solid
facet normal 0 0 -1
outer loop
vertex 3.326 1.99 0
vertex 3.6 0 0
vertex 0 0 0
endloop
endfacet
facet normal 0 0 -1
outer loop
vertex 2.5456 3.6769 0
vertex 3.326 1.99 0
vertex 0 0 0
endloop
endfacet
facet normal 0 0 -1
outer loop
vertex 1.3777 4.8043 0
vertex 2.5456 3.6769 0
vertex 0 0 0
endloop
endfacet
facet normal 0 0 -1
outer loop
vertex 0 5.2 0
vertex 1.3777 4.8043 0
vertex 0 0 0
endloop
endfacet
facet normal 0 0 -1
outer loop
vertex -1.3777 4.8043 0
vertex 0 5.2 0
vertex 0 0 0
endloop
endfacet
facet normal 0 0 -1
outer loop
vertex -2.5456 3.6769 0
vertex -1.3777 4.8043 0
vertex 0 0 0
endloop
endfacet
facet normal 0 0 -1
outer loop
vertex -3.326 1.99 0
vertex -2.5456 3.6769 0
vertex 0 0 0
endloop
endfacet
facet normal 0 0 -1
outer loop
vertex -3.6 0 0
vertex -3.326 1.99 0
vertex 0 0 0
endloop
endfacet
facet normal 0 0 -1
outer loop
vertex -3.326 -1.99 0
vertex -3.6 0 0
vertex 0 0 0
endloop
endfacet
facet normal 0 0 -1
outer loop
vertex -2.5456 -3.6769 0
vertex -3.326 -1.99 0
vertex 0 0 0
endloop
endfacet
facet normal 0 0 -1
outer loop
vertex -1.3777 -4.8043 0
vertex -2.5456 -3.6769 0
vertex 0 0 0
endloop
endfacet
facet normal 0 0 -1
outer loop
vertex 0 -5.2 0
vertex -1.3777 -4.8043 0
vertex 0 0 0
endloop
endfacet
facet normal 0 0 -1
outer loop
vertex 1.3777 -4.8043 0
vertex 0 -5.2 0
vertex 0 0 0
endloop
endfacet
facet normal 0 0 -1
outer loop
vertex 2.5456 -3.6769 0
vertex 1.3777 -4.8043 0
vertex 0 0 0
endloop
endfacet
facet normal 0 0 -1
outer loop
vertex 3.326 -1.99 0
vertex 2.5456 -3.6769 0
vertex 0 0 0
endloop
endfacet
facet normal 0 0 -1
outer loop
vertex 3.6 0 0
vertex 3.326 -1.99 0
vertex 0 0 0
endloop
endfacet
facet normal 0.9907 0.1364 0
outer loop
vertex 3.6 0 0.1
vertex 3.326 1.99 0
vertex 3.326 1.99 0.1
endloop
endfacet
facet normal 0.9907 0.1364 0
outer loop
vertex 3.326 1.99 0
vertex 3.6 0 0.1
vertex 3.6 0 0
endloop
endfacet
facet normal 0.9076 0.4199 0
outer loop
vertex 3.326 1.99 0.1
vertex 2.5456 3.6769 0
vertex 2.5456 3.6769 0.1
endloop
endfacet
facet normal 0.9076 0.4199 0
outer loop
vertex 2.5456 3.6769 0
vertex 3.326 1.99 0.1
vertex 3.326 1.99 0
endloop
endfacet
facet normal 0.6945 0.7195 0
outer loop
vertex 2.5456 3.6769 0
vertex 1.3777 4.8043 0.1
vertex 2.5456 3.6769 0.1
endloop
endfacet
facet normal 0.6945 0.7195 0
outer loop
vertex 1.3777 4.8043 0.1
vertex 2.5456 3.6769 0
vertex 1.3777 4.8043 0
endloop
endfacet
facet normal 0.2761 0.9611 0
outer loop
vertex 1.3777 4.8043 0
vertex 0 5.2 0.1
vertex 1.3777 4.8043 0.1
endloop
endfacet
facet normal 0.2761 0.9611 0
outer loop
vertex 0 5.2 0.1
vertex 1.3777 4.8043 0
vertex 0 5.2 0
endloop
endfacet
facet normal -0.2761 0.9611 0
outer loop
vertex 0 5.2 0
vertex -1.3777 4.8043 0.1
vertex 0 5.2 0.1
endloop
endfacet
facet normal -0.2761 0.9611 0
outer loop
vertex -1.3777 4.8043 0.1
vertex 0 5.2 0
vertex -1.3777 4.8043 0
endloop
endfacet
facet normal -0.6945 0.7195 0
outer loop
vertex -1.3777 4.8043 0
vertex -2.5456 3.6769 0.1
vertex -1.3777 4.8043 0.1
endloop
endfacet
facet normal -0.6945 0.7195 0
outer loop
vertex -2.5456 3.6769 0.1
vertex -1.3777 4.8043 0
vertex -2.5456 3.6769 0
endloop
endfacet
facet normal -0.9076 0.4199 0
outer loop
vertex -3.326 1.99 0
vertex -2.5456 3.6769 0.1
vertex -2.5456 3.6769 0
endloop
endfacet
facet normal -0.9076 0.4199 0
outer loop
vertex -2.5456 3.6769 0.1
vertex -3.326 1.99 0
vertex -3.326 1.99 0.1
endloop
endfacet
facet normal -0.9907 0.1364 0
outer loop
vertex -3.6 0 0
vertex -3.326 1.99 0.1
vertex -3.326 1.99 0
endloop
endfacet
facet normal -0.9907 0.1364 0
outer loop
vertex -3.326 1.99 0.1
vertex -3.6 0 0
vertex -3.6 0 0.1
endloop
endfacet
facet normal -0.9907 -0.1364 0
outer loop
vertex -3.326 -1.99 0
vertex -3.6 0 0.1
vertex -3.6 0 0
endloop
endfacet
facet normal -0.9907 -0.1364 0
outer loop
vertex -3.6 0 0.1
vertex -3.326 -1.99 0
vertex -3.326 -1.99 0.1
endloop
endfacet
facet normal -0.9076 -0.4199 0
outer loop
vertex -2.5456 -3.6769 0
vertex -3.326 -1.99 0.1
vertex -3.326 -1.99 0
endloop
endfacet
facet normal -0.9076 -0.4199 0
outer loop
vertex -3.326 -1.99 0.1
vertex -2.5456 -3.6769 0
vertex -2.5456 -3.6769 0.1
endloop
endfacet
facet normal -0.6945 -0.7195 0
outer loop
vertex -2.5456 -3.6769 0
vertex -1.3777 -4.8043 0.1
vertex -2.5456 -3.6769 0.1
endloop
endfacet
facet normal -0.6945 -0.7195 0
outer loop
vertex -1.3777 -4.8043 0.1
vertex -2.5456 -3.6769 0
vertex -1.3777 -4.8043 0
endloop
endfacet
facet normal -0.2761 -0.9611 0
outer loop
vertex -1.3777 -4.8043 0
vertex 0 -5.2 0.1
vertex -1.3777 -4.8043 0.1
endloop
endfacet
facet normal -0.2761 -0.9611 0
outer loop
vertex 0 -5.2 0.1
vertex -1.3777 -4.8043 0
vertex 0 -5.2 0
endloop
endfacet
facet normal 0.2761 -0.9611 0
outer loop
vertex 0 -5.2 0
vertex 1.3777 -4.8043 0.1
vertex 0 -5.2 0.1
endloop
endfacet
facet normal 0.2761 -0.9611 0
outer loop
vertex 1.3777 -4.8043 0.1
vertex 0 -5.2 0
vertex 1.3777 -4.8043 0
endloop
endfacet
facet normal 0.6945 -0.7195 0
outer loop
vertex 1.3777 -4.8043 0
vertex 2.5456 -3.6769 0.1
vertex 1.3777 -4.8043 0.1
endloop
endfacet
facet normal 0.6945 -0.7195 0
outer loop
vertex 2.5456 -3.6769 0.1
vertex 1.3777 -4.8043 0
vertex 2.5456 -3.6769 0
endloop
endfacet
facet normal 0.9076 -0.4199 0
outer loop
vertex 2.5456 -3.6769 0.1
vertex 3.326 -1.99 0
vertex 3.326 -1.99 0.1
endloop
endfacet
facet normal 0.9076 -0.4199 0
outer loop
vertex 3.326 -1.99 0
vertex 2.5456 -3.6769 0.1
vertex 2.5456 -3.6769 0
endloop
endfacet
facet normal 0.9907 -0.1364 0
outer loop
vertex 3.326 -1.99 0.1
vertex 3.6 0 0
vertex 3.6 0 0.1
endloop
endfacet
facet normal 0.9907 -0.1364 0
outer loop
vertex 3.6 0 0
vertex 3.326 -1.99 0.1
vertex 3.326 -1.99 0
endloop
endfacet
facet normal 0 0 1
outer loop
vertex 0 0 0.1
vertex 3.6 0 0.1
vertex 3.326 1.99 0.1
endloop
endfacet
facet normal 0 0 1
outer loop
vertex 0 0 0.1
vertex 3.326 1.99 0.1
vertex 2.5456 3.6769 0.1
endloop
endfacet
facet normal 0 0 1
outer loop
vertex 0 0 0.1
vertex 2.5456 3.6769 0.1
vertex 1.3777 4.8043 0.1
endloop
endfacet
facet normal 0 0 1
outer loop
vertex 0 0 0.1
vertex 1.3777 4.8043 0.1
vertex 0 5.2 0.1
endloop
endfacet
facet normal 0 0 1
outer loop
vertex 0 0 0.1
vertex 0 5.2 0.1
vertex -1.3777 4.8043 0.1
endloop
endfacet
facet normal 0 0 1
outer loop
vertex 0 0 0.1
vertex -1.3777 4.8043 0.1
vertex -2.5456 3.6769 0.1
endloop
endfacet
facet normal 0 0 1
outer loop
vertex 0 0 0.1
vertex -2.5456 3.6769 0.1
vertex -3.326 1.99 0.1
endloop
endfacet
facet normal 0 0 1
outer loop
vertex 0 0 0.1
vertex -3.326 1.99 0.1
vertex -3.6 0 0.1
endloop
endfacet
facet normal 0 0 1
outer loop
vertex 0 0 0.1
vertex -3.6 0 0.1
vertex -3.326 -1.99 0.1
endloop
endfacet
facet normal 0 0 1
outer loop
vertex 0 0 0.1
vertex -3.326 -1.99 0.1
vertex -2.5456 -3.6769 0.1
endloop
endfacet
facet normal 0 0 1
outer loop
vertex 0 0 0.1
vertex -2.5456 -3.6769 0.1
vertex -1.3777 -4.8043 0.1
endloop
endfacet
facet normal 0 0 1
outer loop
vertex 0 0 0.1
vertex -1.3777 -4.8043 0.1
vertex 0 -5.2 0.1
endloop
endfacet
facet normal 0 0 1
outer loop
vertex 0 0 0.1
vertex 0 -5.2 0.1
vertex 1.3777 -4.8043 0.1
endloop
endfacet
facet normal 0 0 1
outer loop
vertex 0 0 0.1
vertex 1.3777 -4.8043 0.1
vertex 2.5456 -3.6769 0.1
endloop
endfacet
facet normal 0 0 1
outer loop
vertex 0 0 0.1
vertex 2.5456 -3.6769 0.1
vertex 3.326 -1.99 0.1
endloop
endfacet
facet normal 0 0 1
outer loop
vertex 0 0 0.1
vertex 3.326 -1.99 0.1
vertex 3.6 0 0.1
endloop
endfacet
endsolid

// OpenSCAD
// file: ../p/4-4cyli.scad
use <../lib.scad>
function ldraw_lib__4_4cyli() = [
// 0 Cylinder 1.0
// 0 Name: 4-4cyli.dat
// 0 Author: James Jessiman
// 0 !LDRAW_ORG Primitive UPDATE 2005-01
// 0 !LICENSE Licensed under CC BY 4.0 : see CAreadme.txt
// 
// 0 BFC CERTIFY CCW
  [0,"BFC","CERTIFY"],
  [0,"BFC","CCW"],
// 
// 0 !HISTORY 1998-12-15 [PTadmin] Official Update 1998-10
// 0 !HISTORY 2002-03-23 [sbliss] Added BFC statement; merged headers from files in distributions LDraw 0.27 and Complete.
// 0 !HISTORY 2002-04-25 [PTadmin] Official Update 2002-02
// 0 !HISTORY 2004-12-14 [guyvivan] BFC CCW
// 0 !HISTORY 2005-12-28 [PTadmin] Official Update 2005-01
// 0 !HISTORY 2007-06-24 [PTadmin] Header formatted for Contributor Agreement
// 0 !HISTORY 2008-07-01 [PTadmin] Official Update 2008-01
// 
// 
// 4 16 1 1 0 0.9239 1 0.3827 0.9239 0 0.3827 1 0 0
  [4,16,1,1,0,0.9239,1,0.3827,0.9239,0,0.3827,1,0,0],
// 5 24 1 0 0 1 1 0 0.9239 0 0.3827 0.9239 0 -0.3827
  [5,24,1,0,0,1,1,0,0.9239,0,0.3827,0.9239,0,-0.3827],
// 4 16 0.9239 1 0.3827 0.7071 1 0.7071 0.7071 0 0.7071 0.9239 0 0.3827
  [4,16,0.9239,1,0.3827,0.7071,1,0.7071,0.7071,0,0.7071,0.9239,0,0.3827],
// 5 24 0.9239 0 0.3827 0.9239 1 0.3827 0.7071 0 0.7071 1 0 0
  [5,24,0.9239,0,0.3827,0.9239,1,0.3827,0.7071,0,0.7071,1,0,0],
// 4 16 0.7071 1 0.7071 0.3827 1 0.9239 0.3827 0 0.9239 0.7071 0 0.7071
  [4,16,0.7071,1,0.7071,0.3827,1,0.9239,0.3827,0,0.9239,0.7071,0,0.7071],
// 5 24 0.7071 0 0.7071 0.7071 1 0.7071 0.3827 0 0.9239 0.9239 0 0.3827
  [5,24,0.7071,0,0.7071,0.7071,1,0.7071,0.3827,0,0.9239,0.9239,0,0.3827],
// 4 16 0.3827 1 0.9239 0 1 1 0 0 1 0.3827 0 0.9239
  [4,16,0.3827,1,0.9239,0,1,1,0,0,1,0.3827,0,0.9239],
// 5 24 0.3827 0 0.9239 0.3827 1 0.9239 0 0 1 0.7071 0 0.7071
  [5,24,0.3827,0,0.9239,0.3827,1,0.9239,0,0,1,0.7071,0,0.7071],
// 4 16 0 1 1 -0.3827 1 0.9239 -0.3827 0 0.9239 0 0 1
  [4,16,0,1,1,-0.3827,1,0.9239,-0.3827,0,0.9239,0,0,1],
// 5 24 0 0 1 0 1 1 -0.3827 0 0.9239 0.3827 0 0.9239
  [5,24,0,0,1,0,1,1,-0.3827,0,0.9239,0.3827,0,0.9239],
// 4 16 -0.3827 1 0.9239 -0.7071 1 0.7071 -0.7071 0 0.7071 -0.3827 0 0.9239
  [4,16,-0.3827,1,0.9239,-0.7071,1,0.7071,-0.7071,0,0.7071,-0.3827,0,0.9239],
// 5 24 -0.3827 0 0.9239 -0.3827 1 0.9239 -0.7071 0 0.7071 0 0 1
  [5,24,-0.3827,0,0.9239,-0.3827,1,0.9239,-0.7071,0,0.7071,0,0,1],
// 4 16 -0.7071 1 0.7071 -0.9239 1 0.3827 -0.9239 0 0.3827 -0.7071 0 0.7071
  [4,16,-0.7071,1,0.7071,-0.9239,1,0.3827,-0.9239,0,0.3827,-0.7071,0,0.7071],
// 5 24 -0.7071 0 0.7071 -0.7071 1 0.7071 -0.9239 0 0.3827 -0.3827 0 0.9239
  [5,24,-0.7071,0,0.7071,-0.7071,1,0.7071,-0.9239,0,0.3827,-0.3827,0,0.9239],
// 4 16 -0.9239 1 0.3827 -1 1 0 -1 0 0 -0.9239 0 0.3827
  [4,16,-0.9239,1,0.3827,-1,1,0,-1,0,0,-0.9239,0,0.3827],
// 5 24 -0.9239 0 0.3827 -0.9239 1 0.3827 -1 0 0 -0.7071 0 0.7071
  [5,24,-0.9239,0,0.3827,-0.9239,1,0.3827,-1,0,0,-0.7071,0,0.7071],
// 4 16 -1 1 0 -0.9239 1 -0.3827 -0.9239 0 -0.3827 -1 0 0
  [4,16,-1,1,0,-0.9239,1,-0.3827,-0.9239,0,-0.3827,-1,0,0],
// 5 24 -1 0 0 -1 1 0 -0.9239 0 -0.3827 -0.9239 0 0.3827
  [5,24,-1,0,0,-1,1,0,-0.9239,0,-0.3827,-0.9239,0,0.3827],
// 4 16 -0.9239 1 -0.3827 -0.7071 1 -0.7071 -0.7071 0 -0.7071 -0.9239 0 -0.3827
  [4,16,-0.9239,1,-0.3827,-0.7071,1,-0.7071,-0.7071,0,-0.7071,-0.9239,0,-0.3827],
// 5 24 -0.9239 0 -0.3827 -0.9239 1 -0.3827 -0.7071 0 -0.7071 -1 0 0
  [5,24,-0.9239,0,-0.3827,-0.9239,1,-0.3827,-0.7071,0,-0.7071,-1,0,0],
// 4 16 -0.7071 1 -0.7071 -0.3827 1 -0.9239 -0.3827 0 -0.9239 -0.7071 0 -0.7071
  [4,16,-0.7071,1,-0.7071,-0.3827,1,-0.9239,-0.3827,0,-0.9239,-0.7071,0,-0.7071],
// 5 24 -0.7071 0 -0.7071 -0.7071 1 -0.7071 -0.3827 0 -0.9239 -0.9239 0 -0.3827
  [5,24,-0.7071,0,-0.7071,-0.7071,1,-0.7071,-0.3827,0,-0.9239,-0.9239,0,-0.3827],
// 4 16 -0.3827 1 -0.9239 0 1 -1 0 0 -1 -0.3827 0 -0.9239
  [4,16,-0.3827,1,-0.9239,0,1,-1,0,0,-1,-0.3827,0,-0.9239],
// 5 24 -0.3827 0 -0.9239 -0.3827 1 -0.9239 0 0 -1 -0.7071 0 -0.7071
  [5,24,-0.3827,0,-0.9239,-0.3827,1,-0.9239,0,0,-1,-0.7071,0,-0.7071],
// 4 16 0 1 -1 0.3827 1 -0.9239 0.3827 0 -0.9239 0 0 -1
  [4,16,0,1,-1,0.3827,1,-0.9239,0.3827,0,-0.9239,0,0,-1],
// 5 24 0 0 -1 0 1 -1 0.3827 0 -0.9239 -0.3827 0 -0.9239
  [5,24,0,0,-1,0,1,-1,0.3827,0,-0.9239,-0.3827,0,-0.9239],
// 4 16 0.3827 1 -0.9239 0.7071 1 -0.7071 0.7071 0 -0.7071 0.3827 0 -0.9239
  [4,16,0.3827,1,-0.9239,0.7071,1,-0.7071,0.7071,0,-0.7071,0.3827,0,-0.9239],
// 5 24 0.3827 0 -0.9239 0.3827 1 -0.9239 0.7071 0 -0.7071 0 0 -1
  [5,24,0.3827,0,-0.9239,0.3827,1,-0.9239,0.7071,0,-0.7071,0,0,-1],
// 4 16 0.7071 1 -0.7071 0.9239 1 -0.3827 0.9239 0 -0.3827 0.7071 0 -0.7071
  [4,16,0.7071,1,-0.7071,0.9239,1,-0.3827,0.9239,0,-0.3827,0.7071,0,-0.7071],
// 5 24 0.7071 0 -0.7071 0.7071 1 -0.7071 0.9239 0 -0.3827 0.3827 0 -0.9239
  [5,24,0.7071,0,-0.7071,0.7071,1,-0.7071,0.9239,0,-0.3827,0.3827,0,-0.9239],
// 4 16 0.9239 1 -0.3827 1 1 0 1 0 0 0.9239 0 -0.3827
  [4,16,0.9239,1,-0.3827,1,1,0,1,0,0,0.9239,0,-0.3827],
// 5 24 0.9239 0 -0.3827 0.9239 1 -0.3827 1 0 0 0.7071 0 -0.7071
  [5,24,0.9239,0,-0.3827,0.9239,1,-0.3827,1,0,0,0.7071,0,-0.7071],
// 0
];
module ldraw_lib__4_4cyli(step=0, col=false, unit=2/5, alt=false, line=0.2, solid=!$preview)
    makepoly(ldraw_lib__4_4cyli(), step=step, col=col, unit=unit, alt=alt, line=line, solid=solid);
ldraw_lib__4_4cyli(line=0.2);
// file: ../p/4-4disc.scad
use <../lib.scad>
function ldraw_lib__4_4disc() = [
// 0 Disc 1.0
// 0 Name: 4-4disc.dat
// 0 Author: James Jessiman
// 0 !LDRAW_ORG Primitive UPDATE 2002-02
// 0 !LICENSE Licensed under CC BY 4.0 : see CAreadme.txt
// 
// 0 BFC CERTIFY CCW
  [0,"BFC","CERTIFY"],
  [0,"BFC","CCW"],
// 
// 0 !HISTORY 1998-12-15 [PTadmin] Official Update 1998-10
// 0 !HISTORY 2002-03-23 [sbliss] Added BFC statement
// 0 !HISTORY 2002-04-25 [PTadmin] Official Update 2002-02
// 0 !HISTORY 2007-06-24 [PTadmin] Header formatted for Contributor Agreement
// 0 !HISTORY 2008-07-01 [PTadmin] Official Update 2008-01
// 
// 
// 3 16 0 0 0 1 0 0 0.9239 0 0.3827
  [3,16,0,0,0,1,0,0,0.9239,0,0.3827],
// 3 16 0 0 0 0.9239 0 0.3827 0.7071 0 0.7071
  [3,16,0,0,0,0.9239,0,0.3827,0.7071,0,0.7071],
// 3 16 0 0 0 0.7071 0 0.7071 0.3827 0 0.9239
  [3,16,0,0,0,0.7071,0,0.7071,0.3827,0,0.9239],
// 3 16 0 0 0 0.3827 0 0.9239 0 0 1
  [3,16,0,0,0,0.3827,0,0.9239,0,0,1],
// 3 16 0 0 0 0 0 1 -0.3827 0 0.9239
  [3,16,0,0,0,0,0,1,-0.3827,0,0.9239],
// 3 16 0 0 0 -0.3827 0 0.9239 -0.7071 0 0.7071
  [3,16,0,0,0,-0.3827,0,0.9239,-0.7071,0,0.7071],
// 3 16 0 0 0 -0.7071 0 0.7071 -0.9239 0 0.3827
  [3,16,0,0,0,-0.7071,0,0.7071,-0.9239,0,0.3827],
// 3 16 0 0 0 -0.9239 0 0.3827 -1 0 -0
  [3,16,0,0,0,-0.9239,0,0.3827,-1,0,-0],
// 3 16 0 0 0 -1 0 -0 -0.9239 0 -0.3827
  [3,16,0,0,0,-1,0,-0,-0.9239,0,-0.3827],
// 3 16 0 0 0 -0.9239 0 -0.3827 -0.7071 0 -0.7071
  [3,16,0,0,0,-0.9239,0,-0.3827,-0.7071,0,-0.7071],
// 3 16 0 0 0 -0.7071 0 -0.7071 -0.3827 0 -0.9239
  [3,16,0,0,0,-0.7071,0,-0.7071,-0.3827,0,-0.9239],
// 3 16 0 0 0 -0.3827 0 -0.9239 0 0 -1
  [3,16,0,0,0,-0.3827,0,-0.9239,0,0,-1],
// 3 16 0 0 0 0 0 -1 0.3827 0 -0.9239
  [3,16,0,0,0,0,0,-1,0.3827,0,-0.9239],
// 3 16 0 0 0 0.3827 0 -0.9239 0.7071 0 -0.7071
  [3,16,0,0,0,0.3827,0,-0.9239,0.7071,0,-0.7071],
// 3 16 0 0 0 0.7071 0 -0.7071 0.9239 0 -0.3827
  [3,16,0,0,0,0.7071,0,-0.7071,0.9239,0,-0.3827],
// 3 16 0 0 0 0.9239 0 -0.3827 1 0 0
  [3,16,0,0,0,0.9239,0,-0.3827,1,0,0],
// 0
];
module ldraw_lib__4_4disc(step=0, col=false, unit=2/5, alt=false, line=0.2, solid=!$preview)
    makepoly(ldraw_lib__4_4disc(), step=step, col=col, unit=unit, alt=alt, line=line, solid=solid);
ldraw_lib__4_4disc(line=0.2);
// file: ../p/4-4cylc3.scad
use <../lib.scad>
use <4-4cyli.scad>
use <4-4disc.scad>
function ldraw_lib__4_4cylc3() = [
// 0 Cylinder Closed 1.0 without Top or Bottom Edge Lines
// 0 Name: 4-4cylc3.dat
// 0 Author: Chris Dee [cwdee]
// 0 !LDRAW_ORG Primitive UPDATE 2017-01
// 0 !LICENSE Licensed under CC BY 4.0 : see CAreadme.txt
// 
// 0 BFC CERTIFY CCW
  [0,"BFC","CERTIFY"],
  [0,"BFC","CCW"],
// 
// 0 !HISTORY 2017-12-30 [PTadmin] Official Update 2017-01
// 
// 
// 1 16 0 0 0 1 0 0 0 1 0 0 0 1 4-4disc.dat
  [1,16,0,0,0,1,0,0,0,1,0,0,0,1, ldraw_lib__4_4disc()],
// 1 16 0 0 0 1 0 0 0 1 0 0 0 1 4-4cyli.dat
  [1,16,0,0,0,1,0,0,0,1,0,0,0,1, ldraw_lib__4_4cyli()],
// 0
];
module ldraw_lib__4_4cylc3(step=0, col=false, unit=2/5, alt=false, line=0.2, solid=!$preview)
    makepoly(ldraw_lib__4_4cylc3(), step=step, col=col, unit=unit, alt=alt, line=line, solid=solid);
ldraw_lib__4_4cylc3(line=0.2);
// main file
use <../lib.scad>
use <../p/4-4cylc3.scad>
use <../p/4-4disc.scad>
function ldraw_lib__4620858h() = [
// 0 Sticker  1.3 x  0.9 Oval with Chrome Silver Mirror
// 0 Name: 4620858h.dat
// 0 Author: Takeshi Takahashi [RainbowDolphin]
// 0 !LDRAW_ORG Part UPDATE 2024-08
// 0 !LICENSE Licensed under CC BY 4.0 : see CAreadme.txt
// 
// 0 !HELP To be put on a Friends Hand Mirror 96488 at (0,-39.284,-1.25)
// 
// 0 BFC CERTIFY CCW
  [0,"BFC","CERTIFY"],
  [0,"BFC","CCW"],
// 
// 0 !KEYWORDS Beauty Shop, Cosmetics, set 3187
// 
// 0 !HISTORY 2024-09-30 [OrionP] Official Update 2024-08
// 
// 
// 1 16 0 0 0 9 0 0 0 -0.25 0 0 0 13 4-4cylc3.dat
  [1,16,0,0,0,9,0,0,0,-0.25,0,0,0,13, ldraw_lib__4_4cylc3()],
// 1 383 0 -.25 0 9 0 0 0 1 0 0 0 13 4-4disc.dat
  [1,383,0,-.25,0,9,0,0,0,1,0,0,0,13, ldraw_lib__4_4disc()],
];
module ldraw_lib__4620858h(step=0, col=false, unit=2/5, alt=false, line=0.2, solid=!$preview)
    makepoly(ldraw_lib__4620858h(), step=step, col=col, unit=unit, alt=alt, line=line, solid=solid);
ldraw_lib__4620858h(line=0.2);
